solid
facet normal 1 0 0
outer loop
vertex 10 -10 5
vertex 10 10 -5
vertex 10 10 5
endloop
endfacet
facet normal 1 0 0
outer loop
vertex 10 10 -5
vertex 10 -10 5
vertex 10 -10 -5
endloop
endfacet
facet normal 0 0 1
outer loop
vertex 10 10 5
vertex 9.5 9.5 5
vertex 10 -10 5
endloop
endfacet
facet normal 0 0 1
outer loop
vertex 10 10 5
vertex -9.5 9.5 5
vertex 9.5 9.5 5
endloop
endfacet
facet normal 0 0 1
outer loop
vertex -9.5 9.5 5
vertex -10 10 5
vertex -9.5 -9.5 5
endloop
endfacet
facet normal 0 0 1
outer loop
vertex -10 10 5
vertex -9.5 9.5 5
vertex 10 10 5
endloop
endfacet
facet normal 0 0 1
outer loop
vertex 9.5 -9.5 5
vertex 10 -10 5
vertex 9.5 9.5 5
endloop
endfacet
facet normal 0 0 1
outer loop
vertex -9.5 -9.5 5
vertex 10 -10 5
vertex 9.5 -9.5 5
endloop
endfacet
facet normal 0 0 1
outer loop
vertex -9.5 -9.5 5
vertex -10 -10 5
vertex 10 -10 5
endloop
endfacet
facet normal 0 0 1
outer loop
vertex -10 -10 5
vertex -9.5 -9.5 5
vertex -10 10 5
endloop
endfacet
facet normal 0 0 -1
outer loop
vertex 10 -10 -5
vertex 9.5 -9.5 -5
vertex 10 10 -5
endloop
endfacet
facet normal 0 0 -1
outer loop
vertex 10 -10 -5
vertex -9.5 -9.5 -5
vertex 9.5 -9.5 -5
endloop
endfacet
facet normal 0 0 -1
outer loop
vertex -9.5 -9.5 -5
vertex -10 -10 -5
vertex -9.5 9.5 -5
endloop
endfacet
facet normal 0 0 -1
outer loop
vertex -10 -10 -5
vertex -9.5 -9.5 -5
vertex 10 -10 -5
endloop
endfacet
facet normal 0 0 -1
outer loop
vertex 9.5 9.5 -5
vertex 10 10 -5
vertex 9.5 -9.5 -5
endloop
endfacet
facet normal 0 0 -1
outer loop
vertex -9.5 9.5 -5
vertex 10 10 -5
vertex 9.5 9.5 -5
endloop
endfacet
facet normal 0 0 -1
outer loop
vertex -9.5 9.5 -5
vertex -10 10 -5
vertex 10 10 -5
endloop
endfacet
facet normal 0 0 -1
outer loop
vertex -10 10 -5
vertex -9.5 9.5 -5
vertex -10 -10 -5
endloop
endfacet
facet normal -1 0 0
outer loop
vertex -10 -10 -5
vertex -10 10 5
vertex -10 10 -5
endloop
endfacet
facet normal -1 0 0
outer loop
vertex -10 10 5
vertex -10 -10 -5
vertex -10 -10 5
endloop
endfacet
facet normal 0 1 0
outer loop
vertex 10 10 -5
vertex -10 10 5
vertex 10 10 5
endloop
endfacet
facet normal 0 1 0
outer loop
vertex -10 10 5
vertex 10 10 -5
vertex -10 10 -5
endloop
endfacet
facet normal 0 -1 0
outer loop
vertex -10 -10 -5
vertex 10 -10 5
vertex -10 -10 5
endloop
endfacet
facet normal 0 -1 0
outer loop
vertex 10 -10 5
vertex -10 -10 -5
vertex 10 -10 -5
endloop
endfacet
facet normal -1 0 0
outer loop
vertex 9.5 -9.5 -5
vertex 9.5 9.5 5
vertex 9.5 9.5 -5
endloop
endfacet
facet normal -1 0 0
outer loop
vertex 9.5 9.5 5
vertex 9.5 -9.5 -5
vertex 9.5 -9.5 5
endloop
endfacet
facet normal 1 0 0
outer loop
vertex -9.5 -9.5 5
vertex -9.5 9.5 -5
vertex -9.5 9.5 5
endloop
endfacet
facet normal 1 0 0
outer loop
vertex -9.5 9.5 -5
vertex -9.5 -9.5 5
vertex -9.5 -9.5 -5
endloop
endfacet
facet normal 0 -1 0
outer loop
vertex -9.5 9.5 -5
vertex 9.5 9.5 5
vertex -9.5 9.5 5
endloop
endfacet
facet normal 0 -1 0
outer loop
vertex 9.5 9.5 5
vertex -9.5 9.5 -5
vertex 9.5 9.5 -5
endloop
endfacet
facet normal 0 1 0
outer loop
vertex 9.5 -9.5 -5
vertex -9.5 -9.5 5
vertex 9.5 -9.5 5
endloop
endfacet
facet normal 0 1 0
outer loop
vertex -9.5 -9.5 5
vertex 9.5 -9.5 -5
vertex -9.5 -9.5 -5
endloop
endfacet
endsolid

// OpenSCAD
epaisseur = 0.5;
longueur = 20;
largeur = 20;
hauteur = 10;
detail = 100;

module hollow_cube(x,y,z,epaisseur){
	difference(){
		cube([x,y,z], center=true);
		cube([x-2*epaisseur,y-2*epaisseur,z+epaisseur], center=true);
	}
}

module hollow_cylinder(diametre,hauteur,epaisseur){
	difference(){
        cylinder(h=hauteur, r=diametre/2, $fn=detail);
        translate([0,0,-epaisseur/2])
        cylinder(h=hauteur+epaisseur, r=(diametre-2*epaisseur)/2, $fn=detail);
	}
}

hollow_cube(longueur,largeur,hauteur,epaisseur);
//hollow_cylinder(longueur,hauteur,epaisseur);
